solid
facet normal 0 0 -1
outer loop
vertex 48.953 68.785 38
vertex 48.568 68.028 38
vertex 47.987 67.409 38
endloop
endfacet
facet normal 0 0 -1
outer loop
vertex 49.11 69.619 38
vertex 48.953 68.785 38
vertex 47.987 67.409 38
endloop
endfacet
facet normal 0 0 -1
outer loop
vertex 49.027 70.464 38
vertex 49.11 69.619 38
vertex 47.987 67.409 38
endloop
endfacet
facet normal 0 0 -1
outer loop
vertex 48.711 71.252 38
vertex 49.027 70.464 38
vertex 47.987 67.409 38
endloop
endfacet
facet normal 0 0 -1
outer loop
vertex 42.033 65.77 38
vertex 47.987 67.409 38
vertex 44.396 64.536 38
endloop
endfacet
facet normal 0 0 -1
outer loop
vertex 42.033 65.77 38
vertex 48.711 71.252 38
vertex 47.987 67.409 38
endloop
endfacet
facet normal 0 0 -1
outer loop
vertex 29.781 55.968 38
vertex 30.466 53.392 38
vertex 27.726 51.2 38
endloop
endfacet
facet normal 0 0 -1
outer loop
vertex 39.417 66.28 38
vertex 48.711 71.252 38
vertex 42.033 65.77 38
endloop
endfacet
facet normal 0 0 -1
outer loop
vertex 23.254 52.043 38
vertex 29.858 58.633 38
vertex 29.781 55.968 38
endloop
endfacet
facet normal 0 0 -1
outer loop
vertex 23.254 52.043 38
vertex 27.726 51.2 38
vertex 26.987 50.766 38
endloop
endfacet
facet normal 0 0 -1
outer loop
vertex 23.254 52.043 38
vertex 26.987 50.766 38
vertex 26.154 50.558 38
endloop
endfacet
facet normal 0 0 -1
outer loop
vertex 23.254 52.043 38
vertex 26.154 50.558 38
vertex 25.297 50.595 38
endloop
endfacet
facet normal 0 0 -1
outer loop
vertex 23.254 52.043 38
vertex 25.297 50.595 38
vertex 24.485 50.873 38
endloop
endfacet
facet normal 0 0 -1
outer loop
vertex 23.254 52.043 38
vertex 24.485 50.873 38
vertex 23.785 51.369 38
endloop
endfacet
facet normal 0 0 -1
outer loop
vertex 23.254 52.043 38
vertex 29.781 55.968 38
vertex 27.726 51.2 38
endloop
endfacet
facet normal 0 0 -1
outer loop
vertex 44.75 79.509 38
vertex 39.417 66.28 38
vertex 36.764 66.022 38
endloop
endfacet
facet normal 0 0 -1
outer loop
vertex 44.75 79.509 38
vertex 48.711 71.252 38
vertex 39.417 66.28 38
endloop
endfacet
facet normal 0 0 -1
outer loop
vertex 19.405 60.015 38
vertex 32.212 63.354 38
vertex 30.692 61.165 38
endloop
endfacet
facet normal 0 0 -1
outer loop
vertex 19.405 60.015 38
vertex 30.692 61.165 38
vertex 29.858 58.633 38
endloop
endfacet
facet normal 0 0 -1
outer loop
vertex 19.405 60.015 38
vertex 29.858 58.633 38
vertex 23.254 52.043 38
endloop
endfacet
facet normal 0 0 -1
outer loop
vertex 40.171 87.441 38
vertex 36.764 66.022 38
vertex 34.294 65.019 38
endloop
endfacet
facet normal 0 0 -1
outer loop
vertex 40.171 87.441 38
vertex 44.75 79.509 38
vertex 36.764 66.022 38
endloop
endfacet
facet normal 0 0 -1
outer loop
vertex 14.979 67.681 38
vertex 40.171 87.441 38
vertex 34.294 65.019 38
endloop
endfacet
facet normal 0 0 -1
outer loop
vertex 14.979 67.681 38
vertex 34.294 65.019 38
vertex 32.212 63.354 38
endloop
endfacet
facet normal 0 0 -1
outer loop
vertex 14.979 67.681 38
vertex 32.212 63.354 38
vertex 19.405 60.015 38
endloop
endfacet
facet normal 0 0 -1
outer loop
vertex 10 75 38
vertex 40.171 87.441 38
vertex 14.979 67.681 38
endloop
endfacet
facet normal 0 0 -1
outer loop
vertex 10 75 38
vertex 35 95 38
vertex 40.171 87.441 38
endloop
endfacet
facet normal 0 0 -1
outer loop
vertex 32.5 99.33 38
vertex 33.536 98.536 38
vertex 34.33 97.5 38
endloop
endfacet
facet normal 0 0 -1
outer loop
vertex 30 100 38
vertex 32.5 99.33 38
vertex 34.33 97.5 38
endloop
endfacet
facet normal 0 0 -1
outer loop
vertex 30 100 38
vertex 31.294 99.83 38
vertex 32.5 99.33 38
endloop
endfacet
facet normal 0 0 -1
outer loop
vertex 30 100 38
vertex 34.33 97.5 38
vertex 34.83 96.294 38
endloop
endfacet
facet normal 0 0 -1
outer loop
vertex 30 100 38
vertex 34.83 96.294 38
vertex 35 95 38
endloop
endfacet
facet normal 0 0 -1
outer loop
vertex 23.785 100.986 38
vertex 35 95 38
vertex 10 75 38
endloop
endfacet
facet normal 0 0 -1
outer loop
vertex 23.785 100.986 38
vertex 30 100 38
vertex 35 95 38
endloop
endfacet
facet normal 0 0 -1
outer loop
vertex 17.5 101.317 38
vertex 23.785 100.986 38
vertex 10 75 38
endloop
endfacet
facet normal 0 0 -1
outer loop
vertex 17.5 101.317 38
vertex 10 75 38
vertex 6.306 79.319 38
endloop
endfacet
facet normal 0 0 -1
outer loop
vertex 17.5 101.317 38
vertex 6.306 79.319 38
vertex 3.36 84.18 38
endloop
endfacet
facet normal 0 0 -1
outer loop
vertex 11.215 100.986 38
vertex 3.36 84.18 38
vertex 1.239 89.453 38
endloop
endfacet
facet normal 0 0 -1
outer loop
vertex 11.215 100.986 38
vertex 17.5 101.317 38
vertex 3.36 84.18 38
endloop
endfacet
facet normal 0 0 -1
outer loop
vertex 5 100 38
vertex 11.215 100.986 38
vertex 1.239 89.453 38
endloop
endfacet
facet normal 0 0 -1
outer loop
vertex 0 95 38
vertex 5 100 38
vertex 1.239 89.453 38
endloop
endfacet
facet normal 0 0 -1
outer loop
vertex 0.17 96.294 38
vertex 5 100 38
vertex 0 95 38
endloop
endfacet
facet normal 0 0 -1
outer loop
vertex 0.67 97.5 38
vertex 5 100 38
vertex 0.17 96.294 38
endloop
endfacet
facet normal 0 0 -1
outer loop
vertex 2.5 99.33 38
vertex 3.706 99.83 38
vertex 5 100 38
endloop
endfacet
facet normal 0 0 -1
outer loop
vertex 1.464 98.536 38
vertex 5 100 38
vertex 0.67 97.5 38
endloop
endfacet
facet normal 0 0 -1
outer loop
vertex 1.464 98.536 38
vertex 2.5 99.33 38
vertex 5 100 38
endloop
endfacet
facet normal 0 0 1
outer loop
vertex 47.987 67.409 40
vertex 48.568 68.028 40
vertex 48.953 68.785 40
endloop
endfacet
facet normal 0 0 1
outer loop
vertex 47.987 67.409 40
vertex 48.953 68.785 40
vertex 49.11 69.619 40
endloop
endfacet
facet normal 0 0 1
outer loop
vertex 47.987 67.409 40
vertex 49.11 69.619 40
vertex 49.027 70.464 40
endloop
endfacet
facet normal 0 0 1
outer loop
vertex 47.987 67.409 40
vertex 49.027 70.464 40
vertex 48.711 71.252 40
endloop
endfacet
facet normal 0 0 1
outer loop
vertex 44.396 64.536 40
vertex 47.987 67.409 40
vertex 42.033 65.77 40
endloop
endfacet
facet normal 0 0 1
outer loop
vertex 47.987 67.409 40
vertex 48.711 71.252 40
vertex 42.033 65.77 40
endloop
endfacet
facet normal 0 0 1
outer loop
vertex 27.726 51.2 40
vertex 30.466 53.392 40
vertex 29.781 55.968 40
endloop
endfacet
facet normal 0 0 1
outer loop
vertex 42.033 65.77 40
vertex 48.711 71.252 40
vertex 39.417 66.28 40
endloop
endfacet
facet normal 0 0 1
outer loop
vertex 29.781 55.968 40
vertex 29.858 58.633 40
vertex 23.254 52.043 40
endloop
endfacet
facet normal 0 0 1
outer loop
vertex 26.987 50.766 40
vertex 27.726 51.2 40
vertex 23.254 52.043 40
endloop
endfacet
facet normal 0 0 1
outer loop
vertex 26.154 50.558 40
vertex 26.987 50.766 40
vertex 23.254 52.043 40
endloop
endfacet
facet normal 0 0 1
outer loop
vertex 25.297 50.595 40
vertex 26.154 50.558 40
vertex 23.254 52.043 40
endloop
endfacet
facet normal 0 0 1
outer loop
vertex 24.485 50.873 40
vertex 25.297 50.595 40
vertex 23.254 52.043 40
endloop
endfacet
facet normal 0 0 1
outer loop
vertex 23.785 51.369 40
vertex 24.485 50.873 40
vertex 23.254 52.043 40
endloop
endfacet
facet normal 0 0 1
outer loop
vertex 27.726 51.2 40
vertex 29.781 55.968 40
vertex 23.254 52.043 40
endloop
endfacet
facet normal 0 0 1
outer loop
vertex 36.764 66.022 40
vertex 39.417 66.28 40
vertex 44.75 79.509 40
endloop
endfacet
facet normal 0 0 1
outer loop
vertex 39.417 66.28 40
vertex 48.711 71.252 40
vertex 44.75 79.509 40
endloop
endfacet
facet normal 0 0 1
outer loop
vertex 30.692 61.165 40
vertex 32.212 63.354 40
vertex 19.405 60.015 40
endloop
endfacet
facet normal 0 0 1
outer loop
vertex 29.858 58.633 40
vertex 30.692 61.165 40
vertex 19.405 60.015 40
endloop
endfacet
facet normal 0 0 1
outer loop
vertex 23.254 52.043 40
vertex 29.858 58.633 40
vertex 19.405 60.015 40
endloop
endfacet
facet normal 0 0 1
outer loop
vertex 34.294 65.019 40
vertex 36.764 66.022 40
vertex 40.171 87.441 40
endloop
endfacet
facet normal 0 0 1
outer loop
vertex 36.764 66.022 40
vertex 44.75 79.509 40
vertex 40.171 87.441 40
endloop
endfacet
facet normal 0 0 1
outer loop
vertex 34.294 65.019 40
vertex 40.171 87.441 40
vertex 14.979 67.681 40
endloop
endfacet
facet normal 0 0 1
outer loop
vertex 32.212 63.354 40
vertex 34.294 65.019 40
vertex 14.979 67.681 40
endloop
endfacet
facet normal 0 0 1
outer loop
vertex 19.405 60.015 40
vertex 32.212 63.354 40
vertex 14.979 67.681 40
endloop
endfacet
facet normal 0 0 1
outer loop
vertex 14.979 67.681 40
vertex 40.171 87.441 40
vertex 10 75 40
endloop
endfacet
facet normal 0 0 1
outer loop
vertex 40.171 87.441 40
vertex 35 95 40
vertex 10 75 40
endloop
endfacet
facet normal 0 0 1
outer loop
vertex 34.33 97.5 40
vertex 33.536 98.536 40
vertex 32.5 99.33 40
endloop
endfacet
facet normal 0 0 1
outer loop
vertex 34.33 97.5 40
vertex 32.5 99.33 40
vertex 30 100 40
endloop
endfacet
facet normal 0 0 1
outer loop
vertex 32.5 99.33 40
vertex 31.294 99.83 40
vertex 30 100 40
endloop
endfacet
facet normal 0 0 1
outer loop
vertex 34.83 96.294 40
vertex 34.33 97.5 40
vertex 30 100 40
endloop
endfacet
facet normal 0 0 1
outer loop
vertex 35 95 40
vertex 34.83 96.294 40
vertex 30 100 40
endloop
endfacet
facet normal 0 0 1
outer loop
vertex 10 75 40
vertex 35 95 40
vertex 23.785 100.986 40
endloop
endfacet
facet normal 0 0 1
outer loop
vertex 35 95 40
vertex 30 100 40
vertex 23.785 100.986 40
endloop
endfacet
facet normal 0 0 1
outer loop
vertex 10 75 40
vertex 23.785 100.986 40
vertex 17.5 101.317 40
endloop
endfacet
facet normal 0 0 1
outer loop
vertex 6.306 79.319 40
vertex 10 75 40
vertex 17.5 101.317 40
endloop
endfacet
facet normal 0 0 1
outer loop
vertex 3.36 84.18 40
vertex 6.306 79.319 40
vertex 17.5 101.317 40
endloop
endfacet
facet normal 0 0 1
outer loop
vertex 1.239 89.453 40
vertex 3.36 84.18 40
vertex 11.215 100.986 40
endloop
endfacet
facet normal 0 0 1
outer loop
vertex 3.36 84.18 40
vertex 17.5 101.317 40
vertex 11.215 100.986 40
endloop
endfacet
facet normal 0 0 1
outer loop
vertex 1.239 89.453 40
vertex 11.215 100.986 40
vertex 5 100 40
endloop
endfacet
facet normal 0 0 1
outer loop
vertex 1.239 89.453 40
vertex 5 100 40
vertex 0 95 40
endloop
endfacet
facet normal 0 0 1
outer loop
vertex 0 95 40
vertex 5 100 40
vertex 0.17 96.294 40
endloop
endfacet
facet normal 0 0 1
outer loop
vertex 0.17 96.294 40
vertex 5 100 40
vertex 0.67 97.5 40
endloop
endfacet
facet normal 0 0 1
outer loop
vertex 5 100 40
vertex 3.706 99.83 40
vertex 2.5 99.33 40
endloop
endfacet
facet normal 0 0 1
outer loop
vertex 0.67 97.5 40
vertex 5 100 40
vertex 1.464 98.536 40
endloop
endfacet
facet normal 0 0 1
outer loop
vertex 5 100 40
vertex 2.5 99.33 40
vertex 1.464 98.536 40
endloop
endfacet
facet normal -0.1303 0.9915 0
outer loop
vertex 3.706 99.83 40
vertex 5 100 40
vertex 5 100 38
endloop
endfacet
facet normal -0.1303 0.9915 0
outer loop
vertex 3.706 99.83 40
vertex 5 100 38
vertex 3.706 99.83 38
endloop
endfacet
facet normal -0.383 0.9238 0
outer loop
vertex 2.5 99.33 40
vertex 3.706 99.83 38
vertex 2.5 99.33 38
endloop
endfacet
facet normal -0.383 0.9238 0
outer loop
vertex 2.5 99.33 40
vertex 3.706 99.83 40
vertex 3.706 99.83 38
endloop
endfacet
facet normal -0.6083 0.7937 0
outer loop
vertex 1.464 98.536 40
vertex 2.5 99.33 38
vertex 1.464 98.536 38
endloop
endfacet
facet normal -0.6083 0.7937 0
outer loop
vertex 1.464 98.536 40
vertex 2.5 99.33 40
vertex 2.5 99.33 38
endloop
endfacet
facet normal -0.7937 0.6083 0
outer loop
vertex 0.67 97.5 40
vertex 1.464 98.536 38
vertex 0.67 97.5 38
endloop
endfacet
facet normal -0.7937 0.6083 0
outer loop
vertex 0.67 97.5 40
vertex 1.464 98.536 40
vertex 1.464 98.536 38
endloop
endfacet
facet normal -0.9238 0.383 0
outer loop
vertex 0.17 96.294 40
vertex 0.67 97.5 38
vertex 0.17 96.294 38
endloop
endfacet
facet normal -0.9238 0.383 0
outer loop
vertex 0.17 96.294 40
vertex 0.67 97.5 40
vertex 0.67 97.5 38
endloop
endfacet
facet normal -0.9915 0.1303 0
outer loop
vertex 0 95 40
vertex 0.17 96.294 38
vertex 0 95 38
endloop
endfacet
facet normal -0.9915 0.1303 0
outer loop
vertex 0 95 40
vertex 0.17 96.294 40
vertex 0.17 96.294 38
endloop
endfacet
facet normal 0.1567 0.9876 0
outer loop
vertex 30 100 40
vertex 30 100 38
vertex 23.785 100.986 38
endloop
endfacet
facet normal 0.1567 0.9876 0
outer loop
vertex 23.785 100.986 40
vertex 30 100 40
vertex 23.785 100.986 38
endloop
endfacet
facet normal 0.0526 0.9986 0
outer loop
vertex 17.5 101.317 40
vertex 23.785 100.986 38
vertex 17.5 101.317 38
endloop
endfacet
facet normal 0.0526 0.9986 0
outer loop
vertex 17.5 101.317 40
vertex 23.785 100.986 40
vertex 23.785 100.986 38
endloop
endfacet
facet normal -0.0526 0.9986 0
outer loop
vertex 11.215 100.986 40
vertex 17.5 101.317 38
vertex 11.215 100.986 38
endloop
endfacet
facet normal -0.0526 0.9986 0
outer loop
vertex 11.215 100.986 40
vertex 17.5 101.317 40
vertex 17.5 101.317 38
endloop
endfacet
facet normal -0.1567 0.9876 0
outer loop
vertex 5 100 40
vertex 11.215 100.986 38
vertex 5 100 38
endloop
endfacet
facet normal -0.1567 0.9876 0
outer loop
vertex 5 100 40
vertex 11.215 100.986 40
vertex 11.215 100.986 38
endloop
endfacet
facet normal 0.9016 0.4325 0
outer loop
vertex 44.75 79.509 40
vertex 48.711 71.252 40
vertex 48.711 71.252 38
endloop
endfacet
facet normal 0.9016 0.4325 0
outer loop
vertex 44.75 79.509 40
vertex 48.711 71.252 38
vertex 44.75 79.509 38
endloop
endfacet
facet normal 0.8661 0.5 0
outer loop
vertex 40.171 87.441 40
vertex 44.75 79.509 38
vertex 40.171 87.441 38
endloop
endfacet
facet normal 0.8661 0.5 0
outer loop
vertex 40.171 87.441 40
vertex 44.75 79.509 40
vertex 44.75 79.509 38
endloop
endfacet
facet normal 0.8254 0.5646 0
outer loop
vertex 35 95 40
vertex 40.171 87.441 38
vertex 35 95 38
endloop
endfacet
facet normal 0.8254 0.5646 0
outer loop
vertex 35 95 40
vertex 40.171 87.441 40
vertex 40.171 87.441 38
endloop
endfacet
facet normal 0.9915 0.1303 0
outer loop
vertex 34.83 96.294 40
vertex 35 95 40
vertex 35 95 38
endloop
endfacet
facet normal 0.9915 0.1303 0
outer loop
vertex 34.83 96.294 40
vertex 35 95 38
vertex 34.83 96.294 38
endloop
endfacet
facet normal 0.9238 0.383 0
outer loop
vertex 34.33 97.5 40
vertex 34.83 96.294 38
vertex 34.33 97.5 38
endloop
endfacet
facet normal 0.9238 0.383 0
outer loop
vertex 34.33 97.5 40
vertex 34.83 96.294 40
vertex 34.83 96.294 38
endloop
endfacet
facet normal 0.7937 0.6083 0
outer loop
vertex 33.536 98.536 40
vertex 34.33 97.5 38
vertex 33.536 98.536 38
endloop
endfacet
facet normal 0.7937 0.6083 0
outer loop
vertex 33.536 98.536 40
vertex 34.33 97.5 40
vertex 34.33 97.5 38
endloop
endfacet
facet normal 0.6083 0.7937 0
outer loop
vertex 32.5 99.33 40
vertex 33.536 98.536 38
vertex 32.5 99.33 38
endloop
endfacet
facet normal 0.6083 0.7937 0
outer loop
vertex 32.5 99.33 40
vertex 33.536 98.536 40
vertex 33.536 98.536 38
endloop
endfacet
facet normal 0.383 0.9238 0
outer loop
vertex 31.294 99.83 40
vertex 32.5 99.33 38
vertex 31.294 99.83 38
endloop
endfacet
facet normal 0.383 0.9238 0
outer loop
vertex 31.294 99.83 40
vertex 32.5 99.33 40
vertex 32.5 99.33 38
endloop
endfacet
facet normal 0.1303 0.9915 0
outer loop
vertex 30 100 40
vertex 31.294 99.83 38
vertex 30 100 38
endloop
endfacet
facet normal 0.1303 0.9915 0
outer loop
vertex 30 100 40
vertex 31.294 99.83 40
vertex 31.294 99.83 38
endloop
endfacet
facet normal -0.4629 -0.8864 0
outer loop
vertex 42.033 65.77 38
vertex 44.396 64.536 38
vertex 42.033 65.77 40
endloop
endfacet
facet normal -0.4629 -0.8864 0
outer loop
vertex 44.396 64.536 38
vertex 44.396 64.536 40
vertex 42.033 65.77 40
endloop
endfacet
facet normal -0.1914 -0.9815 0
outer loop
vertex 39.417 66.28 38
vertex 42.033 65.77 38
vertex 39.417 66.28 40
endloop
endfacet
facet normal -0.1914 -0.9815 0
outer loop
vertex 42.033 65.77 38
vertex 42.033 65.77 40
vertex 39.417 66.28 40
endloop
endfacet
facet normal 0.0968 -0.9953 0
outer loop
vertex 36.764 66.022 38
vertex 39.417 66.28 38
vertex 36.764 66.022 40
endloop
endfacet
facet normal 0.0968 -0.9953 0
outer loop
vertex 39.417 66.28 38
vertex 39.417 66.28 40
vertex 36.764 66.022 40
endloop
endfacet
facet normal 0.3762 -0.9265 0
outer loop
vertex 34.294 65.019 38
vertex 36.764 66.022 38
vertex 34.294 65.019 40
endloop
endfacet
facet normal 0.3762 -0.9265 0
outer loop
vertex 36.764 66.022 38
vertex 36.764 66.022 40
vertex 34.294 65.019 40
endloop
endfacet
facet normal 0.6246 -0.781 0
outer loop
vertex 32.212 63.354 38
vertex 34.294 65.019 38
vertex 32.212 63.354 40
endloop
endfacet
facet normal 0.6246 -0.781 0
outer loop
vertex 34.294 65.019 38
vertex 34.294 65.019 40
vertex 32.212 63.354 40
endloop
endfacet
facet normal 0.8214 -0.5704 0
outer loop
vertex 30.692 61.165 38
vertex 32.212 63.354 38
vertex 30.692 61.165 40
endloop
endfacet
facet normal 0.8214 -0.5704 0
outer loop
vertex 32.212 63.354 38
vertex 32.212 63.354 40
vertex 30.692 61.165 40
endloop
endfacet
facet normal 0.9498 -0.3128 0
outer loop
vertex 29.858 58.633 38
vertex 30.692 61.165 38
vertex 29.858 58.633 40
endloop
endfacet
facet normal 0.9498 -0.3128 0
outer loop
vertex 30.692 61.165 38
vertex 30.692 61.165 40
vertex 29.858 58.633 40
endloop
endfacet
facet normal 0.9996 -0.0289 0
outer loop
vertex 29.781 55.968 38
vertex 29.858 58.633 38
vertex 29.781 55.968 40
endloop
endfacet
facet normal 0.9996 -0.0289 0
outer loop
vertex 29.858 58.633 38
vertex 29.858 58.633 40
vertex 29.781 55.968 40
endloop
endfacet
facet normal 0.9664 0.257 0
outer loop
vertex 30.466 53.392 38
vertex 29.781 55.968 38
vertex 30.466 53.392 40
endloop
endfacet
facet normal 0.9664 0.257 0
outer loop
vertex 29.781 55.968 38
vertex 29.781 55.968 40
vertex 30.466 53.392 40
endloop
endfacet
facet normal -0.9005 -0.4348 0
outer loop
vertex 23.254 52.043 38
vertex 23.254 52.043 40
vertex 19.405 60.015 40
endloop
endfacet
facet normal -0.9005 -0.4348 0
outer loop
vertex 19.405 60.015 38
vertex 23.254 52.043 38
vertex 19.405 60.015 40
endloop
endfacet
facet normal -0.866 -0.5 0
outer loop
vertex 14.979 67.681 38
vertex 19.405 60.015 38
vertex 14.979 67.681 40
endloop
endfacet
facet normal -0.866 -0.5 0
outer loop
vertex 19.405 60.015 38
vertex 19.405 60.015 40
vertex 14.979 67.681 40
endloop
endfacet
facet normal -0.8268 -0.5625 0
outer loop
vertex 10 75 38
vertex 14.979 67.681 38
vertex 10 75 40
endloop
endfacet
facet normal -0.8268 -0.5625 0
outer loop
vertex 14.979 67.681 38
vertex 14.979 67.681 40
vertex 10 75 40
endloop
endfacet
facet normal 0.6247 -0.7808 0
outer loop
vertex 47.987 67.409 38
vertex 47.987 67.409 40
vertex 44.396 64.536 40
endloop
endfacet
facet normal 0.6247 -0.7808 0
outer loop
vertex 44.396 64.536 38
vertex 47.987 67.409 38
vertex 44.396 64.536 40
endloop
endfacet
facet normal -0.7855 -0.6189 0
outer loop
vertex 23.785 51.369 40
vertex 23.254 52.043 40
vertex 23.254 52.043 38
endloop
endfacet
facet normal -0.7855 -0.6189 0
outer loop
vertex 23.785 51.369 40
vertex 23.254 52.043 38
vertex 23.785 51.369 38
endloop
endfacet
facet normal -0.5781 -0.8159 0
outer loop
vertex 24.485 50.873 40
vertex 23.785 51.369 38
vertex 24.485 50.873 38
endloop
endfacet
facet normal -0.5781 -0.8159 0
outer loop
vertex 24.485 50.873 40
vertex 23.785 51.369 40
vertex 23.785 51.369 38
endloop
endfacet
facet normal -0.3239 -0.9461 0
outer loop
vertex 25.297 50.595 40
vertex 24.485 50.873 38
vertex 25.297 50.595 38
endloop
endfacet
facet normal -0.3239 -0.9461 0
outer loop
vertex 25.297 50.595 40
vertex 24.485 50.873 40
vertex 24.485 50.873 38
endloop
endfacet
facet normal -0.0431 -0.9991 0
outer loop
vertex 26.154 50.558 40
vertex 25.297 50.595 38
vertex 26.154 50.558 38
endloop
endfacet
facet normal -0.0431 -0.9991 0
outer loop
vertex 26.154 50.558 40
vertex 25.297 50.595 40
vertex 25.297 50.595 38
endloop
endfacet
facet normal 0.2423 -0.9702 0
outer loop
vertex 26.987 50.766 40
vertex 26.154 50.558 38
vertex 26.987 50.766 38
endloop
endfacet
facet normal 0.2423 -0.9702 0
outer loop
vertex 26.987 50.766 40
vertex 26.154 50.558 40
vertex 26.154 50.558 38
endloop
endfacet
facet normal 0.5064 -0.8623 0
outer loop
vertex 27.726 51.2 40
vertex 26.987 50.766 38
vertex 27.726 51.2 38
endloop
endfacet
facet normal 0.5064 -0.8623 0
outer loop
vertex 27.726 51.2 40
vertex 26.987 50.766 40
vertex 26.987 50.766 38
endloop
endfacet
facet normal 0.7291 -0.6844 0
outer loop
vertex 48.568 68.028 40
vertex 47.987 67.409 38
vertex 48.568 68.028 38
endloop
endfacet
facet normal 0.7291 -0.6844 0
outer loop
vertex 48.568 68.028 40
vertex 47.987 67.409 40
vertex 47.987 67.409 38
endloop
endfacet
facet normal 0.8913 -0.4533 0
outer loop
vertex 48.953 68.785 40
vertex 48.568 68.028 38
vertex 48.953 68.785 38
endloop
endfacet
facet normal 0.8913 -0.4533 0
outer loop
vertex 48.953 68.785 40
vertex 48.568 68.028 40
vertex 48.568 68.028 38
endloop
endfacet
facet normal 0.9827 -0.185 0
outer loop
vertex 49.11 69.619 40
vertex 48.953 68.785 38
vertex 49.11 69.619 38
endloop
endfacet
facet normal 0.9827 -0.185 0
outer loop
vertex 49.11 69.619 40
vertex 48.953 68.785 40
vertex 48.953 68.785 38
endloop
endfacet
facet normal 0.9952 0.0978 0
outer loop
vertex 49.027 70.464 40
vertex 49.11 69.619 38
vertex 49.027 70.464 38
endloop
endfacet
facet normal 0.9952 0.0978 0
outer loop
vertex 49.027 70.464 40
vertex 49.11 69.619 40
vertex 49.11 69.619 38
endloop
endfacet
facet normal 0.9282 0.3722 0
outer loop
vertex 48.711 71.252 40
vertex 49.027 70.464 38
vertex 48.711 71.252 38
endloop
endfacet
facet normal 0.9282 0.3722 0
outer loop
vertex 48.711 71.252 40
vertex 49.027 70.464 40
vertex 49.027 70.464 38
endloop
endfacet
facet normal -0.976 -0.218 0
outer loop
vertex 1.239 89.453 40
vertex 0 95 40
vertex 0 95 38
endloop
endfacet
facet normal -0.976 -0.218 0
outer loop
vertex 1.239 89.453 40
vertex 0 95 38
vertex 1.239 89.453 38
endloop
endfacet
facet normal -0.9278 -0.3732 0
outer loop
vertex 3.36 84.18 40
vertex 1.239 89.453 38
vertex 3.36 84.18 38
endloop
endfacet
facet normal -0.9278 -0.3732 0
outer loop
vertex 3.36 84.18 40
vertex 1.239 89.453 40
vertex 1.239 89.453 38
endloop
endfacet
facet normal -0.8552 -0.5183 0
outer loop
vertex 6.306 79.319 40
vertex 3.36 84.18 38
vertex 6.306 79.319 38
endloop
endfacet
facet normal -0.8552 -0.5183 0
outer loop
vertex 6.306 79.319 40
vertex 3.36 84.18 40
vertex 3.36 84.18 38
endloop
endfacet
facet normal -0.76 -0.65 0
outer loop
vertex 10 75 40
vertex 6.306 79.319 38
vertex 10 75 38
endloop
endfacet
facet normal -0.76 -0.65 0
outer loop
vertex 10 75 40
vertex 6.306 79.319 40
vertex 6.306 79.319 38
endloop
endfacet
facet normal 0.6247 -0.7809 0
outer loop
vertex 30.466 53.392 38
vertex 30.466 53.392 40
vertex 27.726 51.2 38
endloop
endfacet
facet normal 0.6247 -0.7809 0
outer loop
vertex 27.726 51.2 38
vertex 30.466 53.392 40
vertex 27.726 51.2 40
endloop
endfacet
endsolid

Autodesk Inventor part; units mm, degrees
ref_plane "YZ Plane" through (0, 0, 0) normal (1, 0, 0) x (0, 1, 0)
ref_plane "Plano de trabajo14" through (0, 0, 40) normal (0, 0, 1) x (1, 0, 0)
ref_plane "Plano de trabajo15" through (0, 0, 40) normal (0, 0, -1) x (-1, 0, 0)
sketch "Boceto24" plane through (0, 0, 40) normal (0, 0, -1) x (-1, 0, 0)
  arc A0 (0, 95) -> (-5, 100) centre (-5, 95) ccw
  arc A1 (-30, 100) -> (-35, 95) centre (-30, 95) ccw
  arc A2 (-5, 100) -> (-30, 100) centre (-17.5, 41.3165) ccw
  arc A3 (-10, 75) -> (0, 95) centre (-34.6648, 99.8324) ccw
  line L0 (-47.9872, 67.409) -> (-27.7264, 51.2004)
  arc A4 (-27.7264, 51.2004) -> (-23.2542, 52.043) centre (-25.8523, 53.543) ccw
  arc A5 (-48.7112, 71.2516) -> (-47.9872, 67.409) centre (-46.1131, 69.7516) ccw
  arc A6 (-35, 95) -> (-48.7112, 71.2516) centre (61.3869, 23.5187) ccw
  arc A7 (-10, 75) -> (-23.2542, 52.043) centre (86.6601, 3.8886) ccw
  point P0 (0, 0)
  point P1 (0, 100)
  point P2 (-35, 100)
  point P3 (-25, 49.0192)
  point P4 (-50, 69.0192)
extrude "Extrusión16" add sketch "Boceto24" along normal blind 2
sketch "Boceto34" plane through (0, 0, 40) normal (0, 0, 1) x (1, 0, 0)
  line L0 (30.8918, 53.7327) -> (44.3961, 64.5361)
  line L1 (37.8568, 59.3047) -> (40.3278, 59.3047) construction
  line L2 (30.466, 53.3921) -> (44.3961, 64.5361)
  line L3 (30.466, 53.3921) -> (37.431, 58.9641)
  line L4 (37.431, 58.9641) -> (39.902, 58.9641) construction
  arc A0 (44.3961, 64.5361) -> (30.466, 53.3921) centre (38.9746, 57.0346) ccw
  point P0 (0, 0)
extrude "Extrusión26" cut sketch "Boceto34" against normal blind 10
equation "\"Radio_pliegue\" = Grosor"
equation "\"Anchura_desahogo_plegado\" = Grosor"
equation "\"Profundidad_desahogo_plegado\" = 0.5 * Grosor"
equation "\"Tamaño_destalonado\" = 4 * Grosor"
equation "\"Remanente_mínimo\" = 2 * Grosor"
equation "\"Radiodetransición\" = Radio_pliegue"
equation "\"Tamaño_de_radio_de_Jacobi\" = Radio_pliegue"
equation "\"TamañoSeparación\" = Grosor"
equation "\"Grosor\" = 0.5"
properties part number "brazocuadrado"
